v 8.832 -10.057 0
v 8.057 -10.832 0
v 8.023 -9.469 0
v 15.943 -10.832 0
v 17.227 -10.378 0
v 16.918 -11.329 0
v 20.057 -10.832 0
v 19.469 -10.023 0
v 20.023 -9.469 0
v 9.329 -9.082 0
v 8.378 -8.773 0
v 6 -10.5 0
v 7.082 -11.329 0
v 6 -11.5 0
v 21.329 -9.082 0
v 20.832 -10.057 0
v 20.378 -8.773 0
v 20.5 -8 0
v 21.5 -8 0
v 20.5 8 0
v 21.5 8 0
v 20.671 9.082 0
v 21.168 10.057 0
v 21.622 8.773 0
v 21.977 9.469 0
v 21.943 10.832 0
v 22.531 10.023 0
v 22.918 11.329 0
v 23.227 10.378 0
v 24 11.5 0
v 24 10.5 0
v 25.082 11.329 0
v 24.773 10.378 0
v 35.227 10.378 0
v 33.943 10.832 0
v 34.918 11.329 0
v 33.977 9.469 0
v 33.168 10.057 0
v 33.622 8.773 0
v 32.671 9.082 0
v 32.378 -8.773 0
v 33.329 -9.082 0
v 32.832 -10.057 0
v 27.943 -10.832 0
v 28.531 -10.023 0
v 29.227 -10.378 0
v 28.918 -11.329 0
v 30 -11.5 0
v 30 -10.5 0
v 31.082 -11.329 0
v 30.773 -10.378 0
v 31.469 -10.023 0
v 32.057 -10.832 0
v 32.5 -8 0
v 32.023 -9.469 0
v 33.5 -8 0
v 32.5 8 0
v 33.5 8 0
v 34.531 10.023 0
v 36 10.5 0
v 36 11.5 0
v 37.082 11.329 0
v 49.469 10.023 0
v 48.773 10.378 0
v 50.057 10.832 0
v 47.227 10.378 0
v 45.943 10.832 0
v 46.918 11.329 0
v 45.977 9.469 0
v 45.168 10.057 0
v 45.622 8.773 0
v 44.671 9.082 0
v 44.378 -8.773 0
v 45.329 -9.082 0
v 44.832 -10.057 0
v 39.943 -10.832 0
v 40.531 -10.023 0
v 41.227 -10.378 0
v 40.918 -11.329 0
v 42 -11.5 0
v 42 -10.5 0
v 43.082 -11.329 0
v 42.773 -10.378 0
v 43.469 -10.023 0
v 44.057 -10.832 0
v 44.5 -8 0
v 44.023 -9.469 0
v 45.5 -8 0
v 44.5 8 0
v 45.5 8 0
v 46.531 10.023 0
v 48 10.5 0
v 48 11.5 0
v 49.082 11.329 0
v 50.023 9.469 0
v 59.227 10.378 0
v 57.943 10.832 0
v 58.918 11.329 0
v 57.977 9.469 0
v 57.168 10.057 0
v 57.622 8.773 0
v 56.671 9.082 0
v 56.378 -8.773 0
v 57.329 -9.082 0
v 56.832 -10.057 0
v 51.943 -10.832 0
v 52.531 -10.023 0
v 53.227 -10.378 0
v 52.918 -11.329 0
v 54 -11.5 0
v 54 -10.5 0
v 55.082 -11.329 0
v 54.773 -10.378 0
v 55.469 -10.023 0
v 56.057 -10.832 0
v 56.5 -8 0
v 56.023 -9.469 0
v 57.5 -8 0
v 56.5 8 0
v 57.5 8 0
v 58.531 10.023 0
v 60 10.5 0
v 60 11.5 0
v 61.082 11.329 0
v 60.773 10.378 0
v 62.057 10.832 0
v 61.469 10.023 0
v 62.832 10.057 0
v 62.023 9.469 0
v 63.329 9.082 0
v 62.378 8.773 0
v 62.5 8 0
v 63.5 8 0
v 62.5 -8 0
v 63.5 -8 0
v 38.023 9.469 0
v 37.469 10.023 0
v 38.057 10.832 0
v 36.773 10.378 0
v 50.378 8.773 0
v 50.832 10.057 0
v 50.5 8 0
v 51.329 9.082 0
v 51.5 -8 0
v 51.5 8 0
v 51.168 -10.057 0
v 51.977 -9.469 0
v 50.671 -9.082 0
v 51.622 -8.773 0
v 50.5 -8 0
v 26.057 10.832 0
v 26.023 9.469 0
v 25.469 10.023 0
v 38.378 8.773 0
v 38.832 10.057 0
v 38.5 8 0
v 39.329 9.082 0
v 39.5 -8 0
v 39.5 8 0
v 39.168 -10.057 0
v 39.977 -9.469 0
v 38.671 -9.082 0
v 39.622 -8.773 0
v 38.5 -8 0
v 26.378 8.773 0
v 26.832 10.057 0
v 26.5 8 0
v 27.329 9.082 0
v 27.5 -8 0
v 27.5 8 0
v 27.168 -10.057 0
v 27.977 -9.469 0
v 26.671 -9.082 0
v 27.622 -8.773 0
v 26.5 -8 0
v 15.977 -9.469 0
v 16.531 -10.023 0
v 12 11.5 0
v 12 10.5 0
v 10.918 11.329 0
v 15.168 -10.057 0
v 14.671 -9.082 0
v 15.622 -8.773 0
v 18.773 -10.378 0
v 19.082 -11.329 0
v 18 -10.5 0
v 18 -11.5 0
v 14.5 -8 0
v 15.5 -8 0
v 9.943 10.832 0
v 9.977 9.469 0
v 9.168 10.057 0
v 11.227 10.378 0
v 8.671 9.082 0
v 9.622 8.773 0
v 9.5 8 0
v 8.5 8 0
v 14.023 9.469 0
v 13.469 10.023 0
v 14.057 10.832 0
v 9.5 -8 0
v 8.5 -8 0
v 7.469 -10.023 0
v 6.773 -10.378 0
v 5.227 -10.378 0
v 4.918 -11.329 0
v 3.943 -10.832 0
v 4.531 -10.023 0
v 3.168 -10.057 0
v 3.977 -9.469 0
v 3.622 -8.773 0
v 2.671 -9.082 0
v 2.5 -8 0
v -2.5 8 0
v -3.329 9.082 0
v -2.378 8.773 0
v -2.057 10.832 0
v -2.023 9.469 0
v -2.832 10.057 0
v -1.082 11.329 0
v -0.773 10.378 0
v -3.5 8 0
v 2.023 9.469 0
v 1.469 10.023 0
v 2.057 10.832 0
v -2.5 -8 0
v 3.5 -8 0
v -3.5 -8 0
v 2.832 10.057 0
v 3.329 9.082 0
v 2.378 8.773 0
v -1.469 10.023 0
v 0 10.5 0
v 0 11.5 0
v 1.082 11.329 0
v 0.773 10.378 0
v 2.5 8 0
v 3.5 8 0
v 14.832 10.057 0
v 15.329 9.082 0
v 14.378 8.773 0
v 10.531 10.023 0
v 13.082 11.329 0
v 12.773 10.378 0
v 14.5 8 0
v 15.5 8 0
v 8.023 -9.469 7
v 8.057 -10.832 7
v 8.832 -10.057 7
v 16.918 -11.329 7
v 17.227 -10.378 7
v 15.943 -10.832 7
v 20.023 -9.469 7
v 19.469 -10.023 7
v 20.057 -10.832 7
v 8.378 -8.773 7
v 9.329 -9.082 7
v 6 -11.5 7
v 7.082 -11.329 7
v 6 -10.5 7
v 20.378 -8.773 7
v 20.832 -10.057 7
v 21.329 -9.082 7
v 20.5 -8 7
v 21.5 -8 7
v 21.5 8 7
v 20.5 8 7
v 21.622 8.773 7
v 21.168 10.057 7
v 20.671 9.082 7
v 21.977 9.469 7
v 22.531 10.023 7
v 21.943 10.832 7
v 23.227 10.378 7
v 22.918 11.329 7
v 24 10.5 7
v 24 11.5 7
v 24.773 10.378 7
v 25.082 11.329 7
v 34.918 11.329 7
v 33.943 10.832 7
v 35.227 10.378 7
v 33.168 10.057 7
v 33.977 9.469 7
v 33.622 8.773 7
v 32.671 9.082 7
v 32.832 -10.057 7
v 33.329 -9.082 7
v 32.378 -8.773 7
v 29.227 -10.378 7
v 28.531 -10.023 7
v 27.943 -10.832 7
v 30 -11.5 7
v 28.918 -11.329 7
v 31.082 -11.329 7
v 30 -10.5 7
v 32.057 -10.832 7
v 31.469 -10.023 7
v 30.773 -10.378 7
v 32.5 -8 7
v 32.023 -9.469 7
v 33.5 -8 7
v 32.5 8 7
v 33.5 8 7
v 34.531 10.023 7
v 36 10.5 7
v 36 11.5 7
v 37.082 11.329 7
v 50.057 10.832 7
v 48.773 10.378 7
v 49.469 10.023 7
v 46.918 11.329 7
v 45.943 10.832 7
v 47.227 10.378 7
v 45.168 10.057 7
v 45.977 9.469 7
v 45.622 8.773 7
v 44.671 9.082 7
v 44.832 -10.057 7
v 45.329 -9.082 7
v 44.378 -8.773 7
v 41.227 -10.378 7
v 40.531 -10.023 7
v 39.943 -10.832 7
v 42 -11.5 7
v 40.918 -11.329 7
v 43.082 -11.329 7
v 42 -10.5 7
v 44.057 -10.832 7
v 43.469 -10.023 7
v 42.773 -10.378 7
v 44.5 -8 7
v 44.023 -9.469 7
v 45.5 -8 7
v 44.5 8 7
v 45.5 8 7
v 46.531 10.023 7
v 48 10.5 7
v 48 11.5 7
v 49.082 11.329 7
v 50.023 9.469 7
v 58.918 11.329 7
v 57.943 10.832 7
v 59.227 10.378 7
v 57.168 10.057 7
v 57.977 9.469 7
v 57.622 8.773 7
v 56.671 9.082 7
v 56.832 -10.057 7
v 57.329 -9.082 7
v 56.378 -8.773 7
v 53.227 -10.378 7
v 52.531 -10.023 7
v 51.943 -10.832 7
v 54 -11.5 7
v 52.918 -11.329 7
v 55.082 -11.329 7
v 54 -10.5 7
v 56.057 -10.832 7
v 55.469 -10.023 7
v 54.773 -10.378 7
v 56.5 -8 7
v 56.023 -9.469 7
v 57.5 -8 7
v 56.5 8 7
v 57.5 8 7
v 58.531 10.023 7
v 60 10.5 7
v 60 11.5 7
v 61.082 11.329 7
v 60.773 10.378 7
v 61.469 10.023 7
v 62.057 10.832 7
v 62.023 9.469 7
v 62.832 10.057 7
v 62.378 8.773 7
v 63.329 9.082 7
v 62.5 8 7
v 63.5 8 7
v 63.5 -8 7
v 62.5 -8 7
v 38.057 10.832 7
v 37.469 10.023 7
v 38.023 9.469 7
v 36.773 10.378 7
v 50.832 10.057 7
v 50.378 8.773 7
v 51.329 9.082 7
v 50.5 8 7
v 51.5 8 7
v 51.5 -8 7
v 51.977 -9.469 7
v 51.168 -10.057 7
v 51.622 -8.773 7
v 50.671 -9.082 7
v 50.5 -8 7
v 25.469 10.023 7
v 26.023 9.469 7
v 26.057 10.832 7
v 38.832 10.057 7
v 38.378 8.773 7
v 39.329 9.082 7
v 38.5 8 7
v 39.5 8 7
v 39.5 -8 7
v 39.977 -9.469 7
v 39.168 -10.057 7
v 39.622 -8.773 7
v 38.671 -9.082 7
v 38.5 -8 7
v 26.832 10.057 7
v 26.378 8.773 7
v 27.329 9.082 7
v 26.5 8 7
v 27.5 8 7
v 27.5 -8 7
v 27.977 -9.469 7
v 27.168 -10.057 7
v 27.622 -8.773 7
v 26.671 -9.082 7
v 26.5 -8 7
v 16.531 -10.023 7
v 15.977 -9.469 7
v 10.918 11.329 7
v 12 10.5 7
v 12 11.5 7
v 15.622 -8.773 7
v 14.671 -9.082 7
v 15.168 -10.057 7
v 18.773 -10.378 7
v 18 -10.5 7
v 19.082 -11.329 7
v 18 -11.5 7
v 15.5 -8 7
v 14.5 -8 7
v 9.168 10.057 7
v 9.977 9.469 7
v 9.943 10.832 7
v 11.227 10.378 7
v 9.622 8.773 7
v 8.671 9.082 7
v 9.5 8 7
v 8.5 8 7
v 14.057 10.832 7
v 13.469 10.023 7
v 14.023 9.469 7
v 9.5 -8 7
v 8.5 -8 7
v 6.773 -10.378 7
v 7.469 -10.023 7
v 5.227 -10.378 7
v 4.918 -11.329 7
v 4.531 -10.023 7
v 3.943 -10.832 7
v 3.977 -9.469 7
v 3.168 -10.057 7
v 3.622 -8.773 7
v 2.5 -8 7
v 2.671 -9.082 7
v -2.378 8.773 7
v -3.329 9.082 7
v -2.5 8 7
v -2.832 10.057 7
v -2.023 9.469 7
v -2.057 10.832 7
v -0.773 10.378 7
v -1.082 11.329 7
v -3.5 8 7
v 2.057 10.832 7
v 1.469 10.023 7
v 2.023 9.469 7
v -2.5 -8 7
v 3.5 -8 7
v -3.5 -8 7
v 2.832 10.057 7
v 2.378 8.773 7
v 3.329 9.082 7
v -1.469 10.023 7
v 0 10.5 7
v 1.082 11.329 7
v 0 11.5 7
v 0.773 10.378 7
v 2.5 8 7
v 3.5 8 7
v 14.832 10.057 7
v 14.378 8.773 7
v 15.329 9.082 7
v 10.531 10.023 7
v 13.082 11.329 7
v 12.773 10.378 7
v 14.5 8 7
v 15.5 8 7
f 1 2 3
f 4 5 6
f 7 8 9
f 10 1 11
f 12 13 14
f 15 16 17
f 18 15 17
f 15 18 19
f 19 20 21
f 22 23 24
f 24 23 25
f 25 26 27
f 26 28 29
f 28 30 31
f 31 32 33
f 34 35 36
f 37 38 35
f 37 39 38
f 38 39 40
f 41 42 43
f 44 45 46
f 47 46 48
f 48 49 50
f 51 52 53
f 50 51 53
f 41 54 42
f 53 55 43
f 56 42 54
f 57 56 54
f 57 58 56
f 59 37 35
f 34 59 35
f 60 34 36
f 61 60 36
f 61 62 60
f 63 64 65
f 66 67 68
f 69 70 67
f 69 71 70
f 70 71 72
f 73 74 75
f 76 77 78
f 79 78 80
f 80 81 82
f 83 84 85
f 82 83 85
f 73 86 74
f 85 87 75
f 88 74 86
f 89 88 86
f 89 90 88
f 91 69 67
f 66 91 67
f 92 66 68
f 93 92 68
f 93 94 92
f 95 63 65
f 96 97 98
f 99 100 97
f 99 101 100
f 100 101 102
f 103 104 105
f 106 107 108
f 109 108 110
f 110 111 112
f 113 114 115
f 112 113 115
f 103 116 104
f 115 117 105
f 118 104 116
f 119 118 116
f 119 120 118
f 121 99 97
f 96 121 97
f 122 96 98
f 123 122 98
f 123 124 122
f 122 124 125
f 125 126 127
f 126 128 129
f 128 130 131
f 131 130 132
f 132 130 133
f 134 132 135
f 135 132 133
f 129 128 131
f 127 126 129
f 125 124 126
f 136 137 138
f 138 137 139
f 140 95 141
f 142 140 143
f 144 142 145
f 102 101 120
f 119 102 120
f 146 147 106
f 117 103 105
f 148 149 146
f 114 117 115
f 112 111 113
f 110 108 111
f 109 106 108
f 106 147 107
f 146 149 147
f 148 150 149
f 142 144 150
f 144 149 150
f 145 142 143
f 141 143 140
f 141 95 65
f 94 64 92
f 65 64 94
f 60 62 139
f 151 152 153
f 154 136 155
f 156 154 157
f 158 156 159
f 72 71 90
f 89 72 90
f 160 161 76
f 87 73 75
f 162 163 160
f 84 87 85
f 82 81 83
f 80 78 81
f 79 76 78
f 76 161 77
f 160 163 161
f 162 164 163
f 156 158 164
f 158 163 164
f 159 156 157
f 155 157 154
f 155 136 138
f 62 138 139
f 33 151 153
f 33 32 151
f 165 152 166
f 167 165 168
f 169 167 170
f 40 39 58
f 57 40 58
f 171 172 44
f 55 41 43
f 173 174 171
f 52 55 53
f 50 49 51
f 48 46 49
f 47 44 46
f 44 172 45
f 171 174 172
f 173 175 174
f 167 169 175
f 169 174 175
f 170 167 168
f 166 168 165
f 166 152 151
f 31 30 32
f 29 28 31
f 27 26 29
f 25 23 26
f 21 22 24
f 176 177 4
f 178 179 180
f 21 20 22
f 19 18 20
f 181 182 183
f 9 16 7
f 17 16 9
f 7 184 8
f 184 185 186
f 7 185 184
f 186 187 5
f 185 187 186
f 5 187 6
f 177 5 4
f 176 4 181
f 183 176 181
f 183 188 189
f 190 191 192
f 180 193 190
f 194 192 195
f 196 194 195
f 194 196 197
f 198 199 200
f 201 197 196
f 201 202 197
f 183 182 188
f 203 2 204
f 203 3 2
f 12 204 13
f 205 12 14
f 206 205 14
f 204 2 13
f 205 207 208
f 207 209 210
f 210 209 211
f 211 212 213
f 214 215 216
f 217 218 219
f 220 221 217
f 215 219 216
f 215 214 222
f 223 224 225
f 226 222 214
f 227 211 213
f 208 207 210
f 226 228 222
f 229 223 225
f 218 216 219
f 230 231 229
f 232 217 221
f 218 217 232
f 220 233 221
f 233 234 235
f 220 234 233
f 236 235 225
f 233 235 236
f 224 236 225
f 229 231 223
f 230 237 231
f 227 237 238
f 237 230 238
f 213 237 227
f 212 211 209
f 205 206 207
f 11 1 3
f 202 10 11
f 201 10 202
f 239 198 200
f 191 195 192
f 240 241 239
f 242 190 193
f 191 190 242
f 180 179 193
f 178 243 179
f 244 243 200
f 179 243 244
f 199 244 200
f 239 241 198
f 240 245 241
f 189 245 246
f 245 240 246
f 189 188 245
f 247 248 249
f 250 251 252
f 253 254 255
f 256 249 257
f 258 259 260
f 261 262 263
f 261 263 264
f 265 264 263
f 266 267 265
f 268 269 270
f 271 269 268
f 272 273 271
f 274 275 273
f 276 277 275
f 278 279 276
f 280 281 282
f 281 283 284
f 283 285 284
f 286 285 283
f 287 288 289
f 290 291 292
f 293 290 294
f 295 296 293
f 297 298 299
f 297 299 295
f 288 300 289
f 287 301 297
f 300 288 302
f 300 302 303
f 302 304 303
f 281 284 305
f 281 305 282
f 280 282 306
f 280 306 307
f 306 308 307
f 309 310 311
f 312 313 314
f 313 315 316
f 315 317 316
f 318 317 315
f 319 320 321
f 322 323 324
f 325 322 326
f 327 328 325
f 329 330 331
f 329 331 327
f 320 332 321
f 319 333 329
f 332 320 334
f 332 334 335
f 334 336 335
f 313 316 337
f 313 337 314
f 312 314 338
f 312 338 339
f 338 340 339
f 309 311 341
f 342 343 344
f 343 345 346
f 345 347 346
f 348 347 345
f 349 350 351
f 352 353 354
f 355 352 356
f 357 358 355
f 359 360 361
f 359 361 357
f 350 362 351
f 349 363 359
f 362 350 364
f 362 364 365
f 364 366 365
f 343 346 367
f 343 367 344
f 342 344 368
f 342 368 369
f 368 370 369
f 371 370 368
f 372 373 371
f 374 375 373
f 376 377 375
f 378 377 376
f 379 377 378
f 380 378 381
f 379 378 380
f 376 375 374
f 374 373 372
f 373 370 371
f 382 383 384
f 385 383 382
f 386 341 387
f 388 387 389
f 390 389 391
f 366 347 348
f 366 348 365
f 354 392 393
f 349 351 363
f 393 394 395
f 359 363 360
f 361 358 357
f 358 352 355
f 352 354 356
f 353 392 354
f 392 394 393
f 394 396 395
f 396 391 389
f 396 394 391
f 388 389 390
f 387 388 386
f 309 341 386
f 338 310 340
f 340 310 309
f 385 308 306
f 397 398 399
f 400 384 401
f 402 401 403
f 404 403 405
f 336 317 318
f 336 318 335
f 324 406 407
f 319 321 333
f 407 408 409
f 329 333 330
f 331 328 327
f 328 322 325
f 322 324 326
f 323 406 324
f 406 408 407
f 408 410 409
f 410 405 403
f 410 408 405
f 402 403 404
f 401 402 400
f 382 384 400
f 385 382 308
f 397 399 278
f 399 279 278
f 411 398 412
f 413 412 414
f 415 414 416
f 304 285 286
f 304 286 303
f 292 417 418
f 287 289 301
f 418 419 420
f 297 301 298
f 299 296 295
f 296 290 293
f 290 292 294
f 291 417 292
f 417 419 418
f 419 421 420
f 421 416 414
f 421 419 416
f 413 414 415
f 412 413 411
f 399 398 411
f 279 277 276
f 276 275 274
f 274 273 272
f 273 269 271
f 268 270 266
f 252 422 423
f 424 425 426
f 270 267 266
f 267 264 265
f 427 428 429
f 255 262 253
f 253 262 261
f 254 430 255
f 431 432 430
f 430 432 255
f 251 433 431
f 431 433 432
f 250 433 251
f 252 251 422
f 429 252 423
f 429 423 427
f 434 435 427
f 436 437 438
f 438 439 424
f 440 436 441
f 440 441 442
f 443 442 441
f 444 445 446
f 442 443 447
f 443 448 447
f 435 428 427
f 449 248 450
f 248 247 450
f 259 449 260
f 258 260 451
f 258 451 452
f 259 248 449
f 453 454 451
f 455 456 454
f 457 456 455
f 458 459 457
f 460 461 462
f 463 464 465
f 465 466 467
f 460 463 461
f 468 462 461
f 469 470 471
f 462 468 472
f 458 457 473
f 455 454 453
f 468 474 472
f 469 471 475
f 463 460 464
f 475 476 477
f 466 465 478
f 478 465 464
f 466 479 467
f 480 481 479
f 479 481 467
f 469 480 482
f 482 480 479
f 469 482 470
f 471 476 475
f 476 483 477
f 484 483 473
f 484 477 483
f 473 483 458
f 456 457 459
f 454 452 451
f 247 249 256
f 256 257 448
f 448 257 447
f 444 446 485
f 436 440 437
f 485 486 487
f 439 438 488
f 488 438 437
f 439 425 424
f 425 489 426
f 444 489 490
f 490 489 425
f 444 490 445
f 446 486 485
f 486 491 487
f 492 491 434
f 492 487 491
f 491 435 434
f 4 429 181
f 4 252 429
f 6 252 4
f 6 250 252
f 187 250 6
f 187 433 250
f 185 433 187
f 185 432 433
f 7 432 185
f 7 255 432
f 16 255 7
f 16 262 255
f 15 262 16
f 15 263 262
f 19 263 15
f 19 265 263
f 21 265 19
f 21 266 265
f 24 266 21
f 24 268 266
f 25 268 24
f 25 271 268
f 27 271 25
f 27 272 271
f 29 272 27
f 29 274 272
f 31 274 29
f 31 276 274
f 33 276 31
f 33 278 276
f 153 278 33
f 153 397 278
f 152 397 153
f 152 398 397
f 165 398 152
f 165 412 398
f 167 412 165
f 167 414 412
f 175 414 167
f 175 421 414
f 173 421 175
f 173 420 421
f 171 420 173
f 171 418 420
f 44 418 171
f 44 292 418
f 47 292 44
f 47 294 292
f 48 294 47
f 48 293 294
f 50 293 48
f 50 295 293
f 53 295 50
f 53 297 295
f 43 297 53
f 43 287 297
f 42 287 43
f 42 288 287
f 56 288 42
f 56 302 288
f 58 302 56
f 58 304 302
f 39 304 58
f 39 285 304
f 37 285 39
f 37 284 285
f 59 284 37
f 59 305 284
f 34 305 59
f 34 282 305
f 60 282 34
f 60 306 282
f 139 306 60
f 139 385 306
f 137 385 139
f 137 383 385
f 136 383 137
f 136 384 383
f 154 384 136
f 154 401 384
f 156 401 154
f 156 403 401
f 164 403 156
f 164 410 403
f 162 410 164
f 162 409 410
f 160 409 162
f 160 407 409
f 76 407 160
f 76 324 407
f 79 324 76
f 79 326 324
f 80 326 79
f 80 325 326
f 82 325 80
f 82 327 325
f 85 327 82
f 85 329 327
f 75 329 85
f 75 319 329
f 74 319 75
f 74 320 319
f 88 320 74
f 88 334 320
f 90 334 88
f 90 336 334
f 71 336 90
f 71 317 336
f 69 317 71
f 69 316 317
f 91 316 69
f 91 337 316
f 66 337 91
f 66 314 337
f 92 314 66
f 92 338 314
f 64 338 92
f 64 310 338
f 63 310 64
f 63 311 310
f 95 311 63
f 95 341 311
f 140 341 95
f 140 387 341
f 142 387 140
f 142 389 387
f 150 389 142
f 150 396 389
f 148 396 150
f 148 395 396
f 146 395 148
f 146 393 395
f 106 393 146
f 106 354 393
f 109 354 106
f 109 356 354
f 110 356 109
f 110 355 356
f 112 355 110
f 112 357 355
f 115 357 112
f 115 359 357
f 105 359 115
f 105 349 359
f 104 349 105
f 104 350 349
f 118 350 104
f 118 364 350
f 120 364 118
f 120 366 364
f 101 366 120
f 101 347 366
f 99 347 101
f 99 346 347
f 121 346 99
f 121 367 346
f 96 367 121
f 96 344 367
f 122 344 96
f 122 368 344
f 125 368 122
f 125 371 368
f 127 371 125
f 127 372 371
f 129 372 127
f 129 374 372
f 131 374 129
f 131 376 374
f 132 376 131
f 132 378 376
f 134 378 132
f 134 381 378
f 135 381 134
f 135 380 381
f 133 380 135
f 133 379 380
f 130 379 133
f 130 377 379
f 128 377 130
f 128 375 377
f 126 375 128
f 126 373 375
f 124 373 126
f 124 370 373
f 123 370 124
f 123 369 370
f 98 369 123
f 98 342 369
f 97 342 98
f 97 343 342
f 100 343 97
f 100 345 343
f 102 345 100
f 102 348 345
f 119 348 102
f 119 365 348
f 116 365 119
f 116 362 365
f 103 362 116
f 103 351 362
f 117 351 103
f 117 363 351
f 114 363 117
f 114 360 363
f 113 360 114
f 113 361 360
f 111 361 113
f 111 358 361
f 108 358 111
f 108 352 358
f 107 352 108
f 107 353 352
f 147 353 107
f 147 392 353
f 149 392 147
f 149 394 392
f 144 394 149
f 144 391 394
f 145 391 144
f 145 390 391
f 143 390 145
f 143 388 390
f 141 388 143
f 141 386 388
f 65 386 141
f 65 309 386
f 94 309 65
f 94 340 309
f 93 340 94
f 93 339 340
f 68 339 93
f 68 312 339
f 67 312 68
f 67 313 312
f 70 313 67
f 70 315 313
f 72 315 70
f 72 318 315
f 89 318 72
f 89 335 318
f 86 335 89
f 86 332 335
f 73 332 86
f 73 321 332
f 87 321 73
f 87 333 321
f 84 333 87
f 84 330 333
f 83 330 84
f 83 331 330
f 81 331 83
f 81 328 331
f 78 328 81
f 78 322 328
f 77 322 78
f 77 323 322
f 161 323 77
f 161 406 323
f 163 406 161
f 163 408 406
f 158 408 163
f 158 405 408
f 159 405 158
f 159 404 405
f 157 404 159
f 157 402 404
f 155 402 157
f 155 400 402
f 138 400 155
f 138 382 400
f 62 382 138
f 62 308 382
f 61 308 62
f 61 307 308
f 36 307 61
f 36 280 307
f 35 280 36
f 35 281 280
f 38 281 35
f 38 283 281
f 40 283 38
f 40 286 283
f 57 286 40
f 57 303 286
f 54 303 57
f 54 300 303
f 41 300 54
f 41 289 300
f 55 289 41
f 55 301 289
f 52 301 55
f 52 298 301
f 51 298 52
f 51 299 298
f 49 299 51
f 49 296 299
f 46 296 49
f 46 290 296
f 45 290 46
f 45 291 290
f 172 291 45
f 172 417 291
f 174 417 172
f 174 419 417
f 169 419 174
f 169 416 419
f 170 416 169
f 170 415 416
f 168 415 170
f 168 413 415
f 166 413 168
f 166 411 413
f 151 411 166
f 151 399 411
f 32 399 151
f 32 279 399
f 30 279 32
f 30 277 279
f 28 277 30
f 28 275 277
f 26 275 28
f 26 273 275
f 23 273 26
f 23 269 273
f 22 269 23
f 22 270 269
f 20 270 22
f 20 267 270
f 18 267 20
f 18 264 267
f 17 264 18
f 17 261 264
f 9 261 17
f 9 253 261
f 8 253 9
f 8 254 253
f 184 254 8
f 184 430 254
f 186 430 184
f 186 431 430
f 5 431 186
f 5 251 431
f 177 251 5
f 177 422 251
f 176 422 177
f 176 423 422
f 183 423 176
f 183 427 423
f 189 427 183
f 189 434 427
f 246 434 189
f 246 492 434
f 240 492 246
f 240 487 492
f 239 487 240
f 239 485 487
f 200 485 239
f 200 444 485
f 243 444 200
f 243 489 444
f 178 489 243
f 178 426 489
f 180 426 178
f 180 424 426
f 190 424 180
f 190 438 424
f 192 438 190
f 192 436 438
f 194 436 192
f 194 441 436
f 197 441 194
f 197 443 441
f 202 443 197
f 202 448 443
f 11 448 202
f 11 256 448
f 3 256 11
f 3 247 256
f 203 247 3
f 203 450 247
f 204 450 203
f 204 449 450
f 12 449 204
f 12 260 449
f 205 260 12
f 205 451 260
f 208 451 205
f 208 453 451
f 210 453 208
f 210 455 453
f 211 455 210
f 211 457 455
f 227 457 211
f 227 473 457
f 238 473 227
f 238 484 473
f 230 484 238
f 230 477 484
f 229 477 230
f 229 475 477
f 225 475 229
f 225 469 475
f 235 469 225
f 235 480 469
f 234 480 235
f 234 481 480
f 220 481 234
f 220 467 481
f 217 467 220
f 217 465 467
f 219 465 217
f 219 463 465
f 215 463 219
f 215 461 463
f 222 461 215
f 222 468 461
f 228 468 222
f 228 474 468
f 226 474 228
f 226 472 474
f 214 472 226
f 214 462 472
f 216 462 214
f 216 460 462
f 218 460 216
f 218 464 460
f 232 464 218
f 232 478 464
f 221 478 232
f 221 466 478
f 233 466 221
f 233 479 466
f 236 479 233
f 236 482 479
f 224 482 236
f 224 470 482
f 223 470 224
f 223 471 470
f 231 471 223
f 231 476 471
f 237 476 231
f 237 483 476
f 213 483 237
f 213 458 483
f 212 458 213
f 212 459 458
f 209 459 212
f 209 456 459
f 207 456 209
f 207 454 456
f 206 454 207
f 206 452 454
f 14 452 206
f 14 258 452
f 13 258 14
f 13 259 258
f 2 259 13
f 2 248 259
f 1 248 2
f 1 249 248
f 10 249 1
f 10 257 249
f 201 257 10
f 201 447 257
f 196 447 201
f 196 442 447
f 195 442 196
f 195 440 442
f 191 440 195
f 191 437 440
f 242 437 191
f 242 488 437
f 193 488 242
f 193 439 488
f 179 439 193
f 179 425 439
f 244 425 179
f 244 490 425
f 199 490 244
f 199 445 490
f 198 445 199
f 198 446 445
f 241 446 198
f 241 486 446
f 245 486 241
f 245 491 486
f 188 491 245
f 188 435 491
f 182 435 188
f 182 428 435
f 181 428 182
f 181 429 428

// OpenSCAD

// Inner radius of the loops
innerRadius = 5;

// Outer radius of the loops
outerRadius = 7;

// Width of the entire spring
width=30;

// Number of loop pairs
loops=5;

// Height of the spring
height=7;

// Number of segments in curves
$fn=20;

linear_extrude(height)
difference()
{
    union()
    {
        for(i=[0:loops])
        {
            translate([i*(outerRadius-(outerRadius-innerRadius)/2)*2,0,0])
            {
                square([outerRadius,width-outerRadius*2],center=true);
                translate([0,width/2-outerRadius,0])
                    circle(d=outerRadius);
                translate([outerRadius-(outerRadius-innerRadius)/2,-(width/2-outerRadius),0])
                    circle(d=outerRadius);
            }
        }
    }
    union()
    {
        for(i=[0:loops])
        {
            translate([i*(outerRadius-(outerRadius-innerRadius)/2)*2,0,0])
            {
                square([innerRadius,width-outerRadius*2],center=true);
                translate([0,width/2-outerRadius,0])
                    circle(d=innerRadius);
                translate([outerRadius-(outerRadius-innerRadius)/2,-(width/2-outerRadius),0])
                    circle(d=innerRadius);
                translate([outerRadius-(outerRadius-innerRadius)/2,0,0])
                    square([innerRadius,width-outerRadius*2],center=true);
            }
        }
        translate([loops*(outerRadius-(outerRadius-innerRadius)/2)*2,0,0])
        {
            translate([outerRadius,0,0])
                square([outerRadius,width],center=true);
            translate([outerRadius-(outerRadius-innerRadius)/2,-width+outerRadius,0])
                square([outerRadius,width],center=true);
        }
    }
}
